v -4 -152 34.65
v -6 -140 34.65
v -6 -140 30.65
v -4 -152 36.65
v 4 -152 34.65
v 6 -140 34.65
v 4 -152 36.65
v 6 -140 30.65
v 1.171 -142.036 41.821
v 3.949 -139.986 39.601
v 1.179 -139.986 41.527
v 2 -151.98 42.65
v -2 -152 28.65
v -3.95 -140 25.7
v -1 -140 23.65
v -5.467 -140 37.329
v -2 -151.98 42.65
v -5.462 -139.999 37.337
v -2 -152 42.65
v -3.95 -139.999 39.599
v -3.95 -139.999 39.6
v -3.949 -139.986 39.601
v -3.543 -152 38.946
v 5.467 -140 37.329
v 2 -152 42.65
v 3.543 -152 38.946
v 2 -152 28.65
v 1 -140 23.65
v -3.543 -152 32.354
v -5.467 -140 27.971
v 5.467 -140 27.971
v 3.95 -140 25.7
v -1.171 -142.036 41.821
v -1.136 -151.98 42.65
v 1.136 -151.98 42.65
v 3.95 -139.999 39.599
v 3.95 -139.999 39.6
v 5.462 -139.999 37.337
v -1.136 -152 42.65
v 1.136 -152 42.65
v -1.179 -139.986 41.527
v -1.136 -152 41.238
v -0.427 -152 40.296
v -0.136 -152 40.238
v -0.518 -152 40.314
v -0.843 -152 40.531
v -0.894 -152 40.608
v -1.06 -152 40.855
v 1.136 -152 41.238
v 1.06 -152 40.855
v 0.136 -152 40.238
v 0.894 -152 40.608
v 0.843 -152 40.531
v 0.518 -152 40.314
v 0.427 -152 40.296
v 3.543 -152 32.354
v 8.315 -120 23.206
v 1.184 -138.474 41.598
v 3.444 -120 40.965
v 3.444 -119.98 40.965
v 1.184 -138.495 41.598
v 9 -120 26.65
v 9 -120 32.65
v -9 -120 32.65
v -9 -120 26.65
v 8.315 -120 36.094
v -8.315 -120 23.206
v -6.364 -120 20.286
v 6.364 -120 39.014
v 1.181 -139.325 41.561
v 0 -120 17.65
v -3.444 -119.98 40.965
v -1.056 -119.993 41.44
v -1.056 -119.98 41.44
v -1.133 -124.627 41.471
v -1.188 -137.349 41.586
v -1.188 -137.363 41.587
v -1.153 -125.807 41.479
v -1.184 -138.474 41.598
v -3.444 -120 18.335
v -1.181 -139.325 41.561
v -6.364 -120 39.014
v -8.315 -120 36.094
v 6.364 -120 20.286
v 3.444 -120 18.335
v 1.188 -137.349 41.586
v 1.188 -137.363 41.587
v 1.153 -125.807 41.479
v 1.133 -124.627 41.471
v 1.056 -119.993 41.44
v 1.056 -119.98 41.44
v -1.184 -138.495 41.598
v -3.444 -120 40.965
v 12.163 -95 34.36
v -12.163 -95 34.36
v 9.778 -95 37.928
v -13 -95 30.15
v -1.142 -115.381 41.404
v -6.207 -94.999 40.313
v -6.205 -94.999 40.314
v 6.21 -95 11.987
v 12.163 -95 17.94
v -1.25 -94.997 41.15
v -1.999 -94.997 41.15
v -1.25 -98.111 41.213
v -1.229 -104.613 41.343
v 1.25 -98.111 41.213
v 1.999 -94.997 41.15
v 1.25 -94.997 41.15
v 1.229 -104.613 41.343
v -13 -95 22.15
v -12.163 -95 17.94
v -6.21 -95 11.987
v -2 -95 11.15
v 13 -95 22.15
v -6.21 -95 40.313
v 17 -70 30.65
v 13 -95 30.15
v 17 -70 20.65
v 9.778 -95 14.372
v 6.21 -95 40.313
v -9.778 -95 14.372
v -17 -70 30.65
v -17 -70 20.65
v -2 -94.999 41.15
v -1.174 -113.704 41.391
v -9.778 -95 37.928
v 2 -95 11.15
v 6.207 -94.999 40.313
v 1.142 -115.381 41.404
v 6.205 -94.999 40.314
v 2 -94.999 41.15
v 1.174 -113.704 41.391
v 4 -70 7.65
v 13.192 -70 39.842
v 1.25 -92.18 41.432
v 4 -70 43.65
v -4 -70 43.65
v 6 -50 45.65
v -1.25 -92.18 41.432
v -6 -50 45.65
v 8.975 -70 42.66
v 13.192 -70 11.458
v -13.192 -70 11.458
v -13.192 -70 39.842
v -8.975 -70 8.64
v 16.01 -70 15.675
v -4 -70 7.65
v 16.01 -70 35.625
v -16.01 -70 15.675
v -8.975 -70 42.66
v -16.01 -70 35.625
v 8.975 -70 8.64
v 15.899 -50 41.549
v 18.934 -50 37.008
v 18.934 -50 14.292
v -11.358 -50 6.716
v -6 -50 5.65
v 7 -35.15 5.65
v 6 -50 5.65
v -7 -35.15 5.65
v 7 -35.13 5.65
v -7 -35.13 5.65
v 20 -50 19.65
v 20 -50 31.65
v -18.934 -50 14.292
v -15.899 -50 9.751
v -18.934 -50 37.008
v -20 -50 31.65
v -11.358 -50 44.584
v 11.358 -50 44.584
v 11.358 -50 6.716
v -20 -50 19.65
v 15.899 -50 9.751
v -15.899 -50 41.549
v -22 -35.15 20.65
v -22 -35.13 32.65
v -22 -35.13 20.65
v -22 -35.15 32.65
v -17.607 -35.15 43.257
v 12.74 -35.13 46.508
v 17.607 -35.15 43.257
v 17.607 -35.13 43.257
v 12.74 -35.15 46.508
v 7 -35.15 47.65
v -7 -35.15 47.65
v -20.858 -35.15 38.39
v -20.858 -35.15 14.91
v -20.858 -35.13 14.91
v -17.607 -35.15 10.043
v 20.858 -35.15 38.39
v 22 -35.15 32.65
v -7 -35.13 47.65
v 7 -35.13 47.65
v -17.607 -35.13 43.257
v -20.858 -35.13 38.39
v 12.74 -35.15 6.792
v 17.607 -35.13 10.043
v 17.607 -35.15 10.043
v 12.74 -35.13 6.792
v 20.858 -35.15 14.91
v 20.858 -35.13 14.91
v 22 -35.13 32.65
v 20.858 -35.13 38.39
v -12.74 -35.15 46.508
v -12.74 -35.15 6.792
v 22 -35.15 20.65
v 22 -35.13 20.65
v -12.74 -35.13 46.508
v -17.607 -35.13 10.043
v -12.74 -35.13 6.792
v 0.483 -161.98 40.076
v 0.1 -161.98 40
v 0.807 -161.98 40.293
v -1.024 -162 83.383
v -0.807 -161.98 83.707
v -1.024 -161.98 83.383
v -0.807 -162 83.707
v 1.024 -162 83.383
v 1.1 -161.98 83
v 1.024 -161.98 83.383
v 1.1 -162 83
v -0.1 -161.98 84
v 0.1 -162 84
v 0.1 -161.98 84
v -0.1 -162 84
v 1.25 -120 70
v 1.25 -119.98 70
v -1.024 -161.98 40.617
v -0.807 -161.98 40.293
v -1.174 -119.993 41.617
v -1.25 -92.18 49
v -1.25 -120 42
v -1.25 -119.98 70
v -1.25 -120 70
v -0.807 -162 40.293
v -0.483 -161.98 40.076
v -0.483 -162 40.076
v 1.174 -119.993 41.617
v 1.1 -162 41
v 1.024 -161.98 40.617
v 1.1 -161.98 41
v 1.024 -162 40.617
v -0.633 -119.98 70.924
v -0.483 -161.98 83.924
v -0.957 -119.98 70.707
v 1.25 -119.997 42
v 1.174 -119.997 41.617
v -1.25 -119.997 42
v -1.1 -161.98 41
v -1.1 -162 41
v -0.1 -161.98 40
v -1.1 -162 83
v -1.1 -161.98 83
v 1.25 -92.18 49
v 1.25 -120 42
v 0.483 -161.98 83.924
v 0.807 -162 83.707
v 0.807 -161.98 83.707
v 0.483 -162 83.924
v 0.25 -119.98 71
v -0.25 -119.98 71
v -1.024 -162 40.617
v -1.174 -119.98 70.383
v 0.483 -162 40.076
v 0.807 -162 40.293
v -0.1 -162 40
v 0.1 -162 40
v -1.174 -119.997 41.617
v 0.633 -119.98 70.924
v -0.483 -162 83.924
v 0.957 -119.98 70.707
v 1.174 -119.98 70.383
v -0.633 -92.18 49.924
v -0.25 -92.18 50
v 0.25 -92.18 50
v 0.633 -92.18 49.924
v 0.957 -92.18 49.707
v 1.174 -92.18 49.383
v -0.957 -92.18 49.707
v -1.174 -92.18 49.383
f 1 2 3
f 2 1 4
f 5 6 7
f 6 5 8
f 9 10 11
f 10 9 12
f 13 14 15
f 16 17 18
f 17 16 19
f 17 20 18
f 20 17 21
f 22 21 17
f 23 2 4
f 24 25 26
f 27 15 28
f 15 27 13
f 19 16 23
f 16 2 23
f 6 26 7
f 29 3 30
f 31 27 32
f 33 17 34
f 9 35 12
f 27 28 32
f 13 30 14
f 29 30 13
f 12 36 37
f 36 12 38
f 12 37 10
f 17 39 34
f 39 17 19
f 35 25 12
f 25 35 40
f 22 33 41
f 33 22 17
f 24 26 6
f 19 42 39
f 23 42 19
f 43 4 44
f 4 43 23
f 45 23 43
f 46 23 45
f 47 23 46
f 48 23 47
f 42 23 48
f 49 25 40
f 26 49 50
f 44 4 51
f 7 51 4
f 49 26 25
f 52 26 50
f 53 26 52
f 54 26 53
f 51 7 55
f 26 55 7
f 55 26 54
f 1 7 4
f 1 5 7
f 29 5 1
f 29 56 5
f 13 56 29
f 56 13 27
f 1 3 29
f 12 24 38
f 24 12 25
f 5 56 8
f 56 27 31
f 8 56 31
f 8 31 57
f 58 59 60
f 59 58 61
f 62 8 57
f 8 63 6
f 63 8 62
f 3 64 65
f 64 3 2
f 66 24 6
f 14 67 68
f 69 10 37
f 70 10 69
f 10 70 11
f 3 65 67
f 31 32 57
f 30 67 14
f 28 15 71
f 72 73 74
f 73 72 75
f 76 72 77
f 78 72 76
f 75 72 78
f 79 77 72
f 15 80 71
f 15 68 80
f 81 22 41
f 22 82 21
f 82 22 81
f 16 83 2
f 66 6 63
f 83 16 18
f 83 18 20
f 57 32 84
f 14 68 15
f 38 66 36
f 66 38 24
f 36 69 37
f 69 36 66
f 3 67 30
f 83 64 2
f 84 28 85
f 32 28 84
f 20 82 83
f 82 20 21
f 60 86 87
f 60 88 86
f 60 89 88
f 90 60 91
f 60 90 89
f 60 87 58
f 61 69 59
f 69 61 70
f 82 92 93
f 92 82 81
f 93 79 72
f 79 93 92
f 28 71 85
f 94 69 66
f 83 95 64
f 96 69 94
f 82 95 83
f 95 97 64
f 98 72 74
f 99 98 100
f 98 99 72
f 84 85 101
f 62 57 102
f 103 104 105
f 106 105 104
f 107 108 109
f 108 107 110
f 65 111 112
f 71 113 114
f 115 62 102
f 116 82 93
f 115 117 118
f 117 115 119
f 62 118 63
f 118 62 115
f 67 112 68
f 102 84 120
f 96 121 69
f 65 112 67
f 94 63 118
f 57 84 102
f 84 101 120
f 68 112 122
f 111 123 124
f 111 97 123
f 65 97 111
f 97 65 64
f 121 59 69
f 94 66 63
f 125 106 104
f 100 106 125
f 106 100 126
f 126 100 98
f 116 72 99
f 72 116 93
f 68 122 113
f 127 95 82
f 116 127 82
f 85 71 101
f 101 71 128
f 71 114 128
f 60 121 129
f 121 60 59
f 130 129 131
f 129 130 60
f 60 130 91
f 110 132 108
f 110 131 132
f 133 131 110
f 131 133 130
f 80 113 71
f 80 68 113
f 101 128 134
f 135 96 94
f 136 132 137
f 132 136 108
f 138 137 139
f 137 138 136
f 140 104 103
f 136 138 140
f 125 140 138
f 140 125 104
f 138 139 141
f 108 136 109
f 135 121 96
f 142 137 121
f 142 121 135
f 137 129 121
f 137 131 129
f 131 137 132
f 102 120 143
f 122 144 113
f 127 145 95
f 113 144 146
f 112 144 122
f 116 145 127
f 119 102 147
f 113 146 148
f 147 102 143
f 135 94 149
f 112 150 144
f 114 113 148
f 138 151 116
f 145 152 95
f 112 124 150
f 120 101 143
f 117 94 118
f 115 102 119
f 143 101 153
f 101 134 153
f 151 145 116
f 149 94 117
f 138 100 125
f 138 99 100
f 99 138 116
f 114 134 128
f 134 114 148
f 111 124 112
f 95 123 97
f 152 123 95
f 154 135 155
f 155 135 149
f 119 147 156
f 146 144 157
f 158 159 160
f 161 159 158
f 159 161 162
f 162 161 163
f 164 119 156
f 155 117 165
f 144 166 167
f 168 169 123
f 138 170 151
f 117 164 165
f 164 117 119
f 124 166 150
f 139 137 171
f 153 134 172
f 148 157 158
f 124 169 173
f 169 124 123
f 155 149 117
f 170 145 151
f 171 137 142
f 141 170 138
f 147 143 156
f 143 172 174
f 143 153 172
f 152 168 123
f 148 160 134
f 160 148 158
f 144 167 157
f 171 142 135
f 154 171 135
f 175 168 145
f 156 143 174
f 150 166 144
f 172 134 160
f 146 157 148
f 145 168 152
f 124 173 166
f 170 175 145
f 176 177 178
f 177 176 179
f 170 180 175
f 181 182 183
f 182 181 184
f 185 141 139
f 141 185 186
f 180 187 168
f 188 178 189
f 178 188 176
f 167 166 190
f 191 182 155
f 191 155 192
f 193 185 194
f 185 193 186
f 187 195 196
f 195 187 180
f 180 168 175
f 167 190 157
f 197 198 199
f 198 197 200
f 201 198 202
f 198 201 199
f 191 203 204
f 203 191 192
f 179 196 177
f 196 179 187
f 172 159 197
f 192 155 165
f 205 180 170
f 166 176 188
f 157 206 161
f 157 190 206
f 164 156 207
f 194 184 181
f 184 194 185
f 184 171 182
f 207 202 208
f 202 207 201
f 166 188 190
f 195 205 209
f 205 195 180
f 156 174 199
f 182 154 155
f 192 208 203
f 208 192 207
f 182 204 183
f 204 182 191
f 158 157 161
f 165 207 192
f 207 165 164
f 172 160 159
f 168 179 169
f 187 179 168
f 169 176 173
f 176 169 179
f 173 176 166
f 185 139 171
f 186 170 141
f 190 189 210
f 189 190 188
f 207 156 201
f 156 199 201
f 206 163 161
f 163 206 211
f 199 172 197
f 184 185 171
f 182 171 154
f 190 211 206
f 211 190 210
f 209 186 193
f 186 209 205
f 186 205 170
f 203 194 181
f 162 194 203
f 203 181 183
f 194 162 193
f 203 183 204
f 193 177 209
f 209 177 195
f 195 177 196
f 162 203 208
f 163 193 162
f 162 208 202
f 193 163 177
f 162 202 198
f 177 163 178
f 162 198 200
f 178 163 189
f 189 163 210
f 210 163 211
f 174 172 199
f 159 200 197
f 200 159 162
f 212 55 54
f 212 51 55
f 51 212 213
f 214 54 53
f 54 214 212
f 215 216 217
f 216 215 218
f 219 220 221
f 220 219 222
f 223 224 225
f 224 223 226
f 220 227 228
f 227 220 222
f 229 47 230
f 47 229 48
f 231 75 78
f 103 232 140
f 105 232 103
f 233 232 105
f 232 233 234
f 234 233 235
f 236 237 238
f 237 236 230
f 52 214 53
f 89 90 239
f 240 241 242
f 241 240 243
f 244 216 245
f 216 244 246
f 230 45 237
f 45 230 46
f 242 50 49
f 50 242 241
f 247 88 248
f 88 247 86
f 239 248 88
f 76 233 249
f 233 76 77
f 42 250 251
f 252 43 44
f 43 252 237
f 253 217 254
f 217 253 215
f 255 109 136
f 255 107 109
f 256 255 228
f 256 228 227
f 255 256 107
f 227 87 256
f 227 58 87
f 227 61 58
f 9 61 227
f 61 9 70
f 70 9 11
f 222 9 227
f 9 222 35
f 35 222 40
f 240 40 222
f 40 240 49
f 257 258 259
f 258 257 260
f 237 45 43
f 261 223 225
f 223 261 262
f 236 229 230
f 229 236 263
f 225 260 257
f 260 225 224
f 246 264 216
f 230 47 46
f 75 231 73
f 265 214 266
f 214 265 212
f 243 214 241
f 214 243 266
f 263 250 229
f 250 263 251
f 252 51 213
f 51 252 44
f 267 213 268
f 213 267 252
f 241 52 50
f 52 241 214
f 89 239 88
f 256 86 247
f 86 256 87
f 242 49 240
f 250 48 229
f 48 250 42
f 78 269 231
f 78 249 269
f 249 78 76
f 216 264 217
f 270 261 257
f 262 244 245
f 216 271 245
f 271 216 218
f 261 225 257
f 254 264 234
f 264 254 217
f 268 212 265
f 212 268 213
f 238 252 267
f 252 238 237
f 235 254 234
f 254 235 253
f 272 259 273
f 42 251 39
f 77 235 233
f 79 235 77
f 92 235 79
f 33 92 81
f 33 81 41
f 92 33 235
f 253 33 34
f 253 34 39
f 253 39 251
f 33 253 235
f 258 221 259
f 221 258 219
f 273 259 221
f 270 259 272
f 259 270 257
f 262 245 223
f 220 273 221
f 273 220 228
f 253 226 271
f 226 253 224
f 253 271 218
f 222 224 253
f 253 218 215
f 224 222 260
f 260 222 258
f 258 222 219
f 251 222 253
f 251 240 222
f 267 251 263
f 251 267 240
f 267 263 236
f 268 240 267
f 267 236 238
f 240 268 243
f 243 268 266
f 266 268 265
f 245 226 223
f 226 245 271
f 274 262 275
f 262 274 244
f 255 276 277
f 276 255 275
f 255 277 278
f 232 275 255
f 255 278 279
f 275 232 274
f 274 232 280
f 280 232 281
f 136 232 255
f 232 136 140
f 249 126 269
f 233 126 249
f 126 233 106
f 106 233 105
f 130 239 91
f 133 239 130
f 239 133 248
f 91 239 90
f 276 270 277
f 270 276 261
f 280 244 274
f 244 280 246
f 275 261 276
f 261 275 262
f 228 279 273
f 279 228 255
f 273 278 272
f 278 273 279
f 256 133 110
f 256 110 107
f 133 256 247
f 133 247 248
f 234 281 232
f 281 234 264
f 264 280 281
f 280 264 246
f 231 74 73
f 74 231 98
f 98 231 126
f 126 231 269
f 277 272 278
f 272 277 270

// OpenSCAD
// file: ../lib.scad
// ===== 공용 프리미티브 (params 의존 없음 — use로 포함. 함정 1) =====

// 두 점을 잇는 캡슐. 끝단이 od/2 만큼 뻗는다 (함정 3)
module rod(p1, p2, od, fn = 56)
    hull() { translate(p1) sphere(d = od, $fn = fn);
             translate(p2) sphere(d = od, $fn = fn); }

function mir(p, s = 1) = [s * p.x, p.y, p.z];

// --- 라운디드 사각 2D 폴리곤 (CCW) ---
function arc_pt(cx, cy, r, a) = [cx + r * cos(a), cy + r * sin(a)];
function rrpts(w, h, r, n = 4) =
    let (x = w / 2 - r, y = h / 2 - r)
    concat(
        [for (i = [0:n]) arc_pt( x, -y, r, -90 + 90 * i / n)],
        [for (i = [0:n]) arc_pt( x,  y, r,   0 + 90 * i / n)],
        [for (i = [0:n]) arc_pt(-x,  y, r,  90 + 90 * i / n)],
        [for (i = [0:n]) arc_pt(-x, -y, r, 180 + 90 * i / n)]);

// y 위치의 XZ 단면 슬래브 (중심 x0/zc, 폭 w/높이 h, 모서리 r).
// 회전 매핑: 2D x→차량 X, 2D y→차량 Z, 돌출 +z→−Y (y..y+0.02 전방 전용, 함정 20)
module slabr(y, x0, w, h, zc, r)
    translate([x0, y + 0.02, zc]) rotate([90, 0, 0])
        linear_extrude(0.02) polygon(rrpts(w, h, r));

// 단면 체인 loft: sec = [[y, x0, w, h, zc, r], ...]
module loftr(sec)
    for (i = [0 : len(sec) - 2])
        hull() {
            slabr(sec[i][0],     sec[i][1],     sec[i][2],     sec[i][3],     sec[i][4],     sec[i][5]);
            slabr(sec[i + 1][0], sec[i + 1][1], sec[i + 1][2], sec[i + 1][3], sec[i + 1][4], sec[i + 1][5]);
        }

// 라운디드 박스 (z0..z1 수직, 평면 모서리 r)
module rbox(xc, yc, z0, z1, dx, dy, r, fn = 32)
    hull() for (px = [-1, 1], py = [-1, 1])
        translate([xc + px * (dx / 2 - r), yc + py * (dy / 2 - r), z0])
            cylinder(r = r, h = z1 - z0, $fn = fn);

// --- NACA 계열 에어포일 (LE 원점, 2D +x = 현 방향) ---
function _yt(x, c, t) = 5 * t * c * (0.2969*sqrt(x) - 0.1260*x - 0.3516*x*x
    + 0.2843*x*x*x - 0.1036*x*x*x*x);
function _yc(x, c, m) = 4 * m * c * x * (1 - x);
function naca_pts(c, t, m, n = 12) =
    concat(
        [for (i = [0:n])     let (x = i / n)     [x*c,  _yt(x, c, t) + _yc(x, c, m)]],
        [for (i = [n-1:-1:0]) let (x = i / n)    [x*c, -_yt(x, c, t) + _yc(x, c, m)]]);

// 슬라이스 3D 링: v=[x, yle, zle, c, aoa, th, cam] → 받각 회전된 naca 점의 링
// (th/cam은 mm — 현 대비 비율로 정규화)
function wring(v, n = 12) =
    let (c = v[3], t = v[5] / c, m = v[6] / c, pts = naca_pts(c, t, m, n),
         ca = cos(v[4]), sa = sin(v[4]))
    // 코드 방향 (ca,sa) + 두께/캠버 수직 방향 (-sa,ca) — 2D y 누락 금지
    [for (p = pts) [v[0], v[1] + p[0] * ca - p[1] * sa, v[2] + p[0] * sa + p[1] * ca]];

// 진짜 로프트 윙 — polyhedron 스트립. hull 체인은 캠버진 하면을 볼록 껍질로
// 채워(LE→TE 직선 웨지) 요소가 처지므로 쓰지 않는다
module wing3(sl, n = 12) {
    rings = [for (v = sl) wring(v, n)];
    ns = len(rings);
    m = len(rings[0]);
    pts = [for (r = rings, p = r) p];
    function ix(i, k) = i * m + (k % m);
    faces = concat(
        // 측면 스트립 (사중면 → 삼각형 2) — 외향 노멀 권선(캡과 일치)
        [for (i = [0 : ns - 2], k = [0 : m - 1])
            each [[ix(i, k), ix(i, k + 1), ix(i + 1, k + 1)],
                  [ix(i, k), ix(i + 1, k + 1), ix(i + 1, k)]]],
        // 끝 캡 (링은 단순 폴리곤 — 팬 삼각분할)
        [for (k = [1 : m - 2]) [ix(0, 0), ix(0, k + 1), ix(0, k)]],
        [for (k = [1 : m - 2]) [ix(ns - 1, 0), ix(ns - 1, k), ix(ns - 1, k + 1)]]
    );
    polyhedron(points = pts, faces = faces, convexity = 4);
}

// 반쪽 슬라이스 → x-대칭 전체. 규약: half는 센터(x=0)→팁 순서(내림차순 x).
// 결과는 x 오름차순 체인. x=0 센터만 중복 제외 (그 외 전부 미러)
function wsym(half) =
    concat([for (i = [len(half) - 1 : -1 : 0]) half[i]],
           [for (i = [0 : len(half) - 1]) if (abs(half[i][0]) > 1e-9)
               concat([-half[i][0]], [for (j = [1 : len(half[i]) - 1]) half[i][j]])]);

// 환(링), 축 Z
module ann(r_in, r_out, h, fn = 96)
    difference() { cylinder(r = r_out, h = h, center = true, $fn = fn);
                   cylinder(r = r_in,  h = h + 2, center = true, $fn = fn); }

// 리스트 전체 x반전+순서 역행 (센터 구간 없는 플랩 등 — 좌우 별도 wing3 호출용).
// x반전만 하면 행렬식이 음수가 되어 권선이 뒤집힌다 → 순서 역행으로 상쇄
function msym(half) =
    [for (i = [len(half) - 1 : -1 : 0])
        concat([-half[i][0]], [for (j = [1 : len(half[i]) - 1]) half[i][j]])];
// file: ../params.scad
// =====================================================================
// F1 그랜드파이언스 카 1:10 — 전체 파라미터 (유일한 수정 지점)
// 좌표계: +Y 전방, +X 좌측, +Z 상방, 지면 z=0, 원점=휠베이스 중심
// 전장 558 (y -268..+278), 전폭 194, 휠베이스 360, 타이어 OD 72 (720mm)
// 30부품. loftr 단면 = [y, x0, w, h, zc, r] (XZ 단면, y..y+0.02 슬래브)
// wing3 슬라이스 = [x, yle, zle, c, aoa, th, cam]
//   aoa: 현 방향의 X축 회전각. 전방 받각 요소는 165~170 (TE가 뒤+위)
// =====================================================================
$fn = 96;

// -- 휠/액슬 (실차 720mm 타이어, 18인치 림, 트랙 F1600/R1550) --
AXF_Y = 180;   AXR_Y = -180;
WHF_X = 80;    WHR_X = 77.5;
WH_Z  = 36;
TIRF_W = 30.5; TIRR_W = 40.5;  TIR_R = 36;
TIR_FN = 288;                 // 타이어 회전체 해상도
RIM_R = 23.2;  RIM_T = 1.0;   // 림 배럴 반경/두께
RIM_LF = 12.4; RIM_LR = 17.4; // 림 배럴 반폭
HUB_BORE = 7.0; STUB_D = 6.2; // 방사 간극 0.4
DISC_R = 15.5;                // 브레이크 디스크

// -- 바디 공통 레벨 --
FLO_Z0 = 2.0;  FLO_Z1 = 5.5;  // 플로어 (두께 3.5)
BOD_Z0 = 5.65;                // 샤시/카버/기어박스 바닥 (플로어 위 0.15)
J = 0.15;                     // 부품 접합 기본 간극
ARM_OD = 3.4;                 // 서스펜션 암 캡슐 직경

// ===== 01 플로어 =====
FLOOR_SEC = [
    [132,    0,  92, 3.5, 3.75, 1.5], [100, 0, 118, 3.5, 3.75, 1.5],
    [60,     0, 130, 3.5, 3.75, 2.0], [10,  0, 132, 3.5, 3.75, 2.0],
    [-60,    0, 128, 3.5, 3.75, 2.0], [-120, 0, 112, 3.5, 3.75, 2.0],
    [-161.85, 0, 100, 3.5, 3.75, 2.0]];

// ===== 02 디퓨저 (램프 + 스트레이크는 부품 내부) =====
DIFF_SEC = [
    [-230,   0, 100, 10.0, 11.0, 1.5], [-215, 0, 100, 8.0,  9.0, 1.5],
    [-190,   0, 100,  6.0,  6.2, 1.5], [-162.0, 0, 100, 4.0, 4.15, 1.5]];
DIFF_TOP = [[-175, 7.8], [-205, 11.9], [-228, 15.6]];  // (y, 램프 상면 z)

// ===== 03 플로어 에지 윙 =====
FEW_SEC = [   // [y, x0, w, h, zc, r] — x0 부호로 좌우
    [55,   63.5, 3.0, 2.0, 6.65, 1.0], [-5,  65.5, 3.0, 5.5, 8.40, 1.5],
    [-70,  63.0, 3.0, 4.0, 7.65, 1.5], [-120, 58.0, 3.0, 3.0, 7.15, 1.5]];
FEW2_SEC = [
    [100, 57.0, 2.5, 1.5, 6.40, 0.8], [60, 60.0, 2.5, 2.0, 6.65, 0.8]];

// ===== 04 노우즈 =====
NOSE_SEC = [
    [95,   0, 38, 28, 25.3, 12], [100,  0, 38, 29, 25.3, 12],
    [115,  0, 36, 28, 23.8, 11], [135,  0, 31, 24, 21.3,  9],
    [160,  0, 27, 20, 18.3,  8], [185,  0, 23, 17, 15.8,  7],
    [205,  0, 20, 15, 14.3,  6], [224,  0, 17, 12, 12.3,  5],
    [242,  0, 14,  9, 10.8,  4], [258,  0, 10,  7, 10.1,  3],
    [272,  0,  4.5, 4.5, 9.8, 2], [273.5, 0, 1.2, 1.2, 9.8, 0.6]];

// ===== 05 샤시(모노코크) + 콕핏 컷 =====
CHAS_SEC = [
    [-34.85, 0, 46, 44, 27.65, 15], [-10, 0, 48, 46, 28.65, 15],
    [20,     0, 48, 44, 27.65, 15], [60,  0, 46, 40, 25.65, 14],
    [94.85,  0, 42, 34, 22.65, 12]];
CKP_CUT = [[62, 0, 34, 32, 46, 3], [-30, 0, 34, 30, 45, 3]];

// ===== 06 엔진 커버 + 샤크핀 =====
COV_SEC = [
    [-152,   0,  8, 14, 35.65,  6], [-140, 0, 12, 18, 32.65,  7],
    [-120,   0, 18, 24, 29.65,  9], [-95,  0, 26, 30, 26.15, 11],
    [-70,    0, 34, 36, 25.65, 13], [-50,  0, 40, 40, 25.65, 14],
    [-35.15, 0, 44, 42, 26.65, 15]];
FIN_SEC = [
    [-162, 0, 2.2, 44, 62.0, 1], [-120, 0, 2.5, 30, 56.0, 1],
    [-92.2, 0, 2.5, 10, 45.0, 1]];

// ===== 07 에어박스 (험프 + 인테이크 링) =====
ABX_SEC = [
    [-92, 0, 14, 17, 50.00, 6], [-68, 0, 20, 24, 56.60, 8],
    [-46, 0, 22, 26, 59.60, 8], [-34, 0, 22, 13, 56.30, 6]];
ABX_RING_C = [0, -45, 73.5];  ABX_RING_R = 11;  ABX_RING_T = 4.5;
ABX_RING_SZ = 0.72;

// ===== 08 사이드포드 (x0=±41.5) =====
SPOD_X0 = 41.5;
SPOD_SEC = [   // [y, w, h, zc, r]
    [38,   34, 26, 18.65, 8], [5,   34, 28, 19.65, 9], [-25,  34, 26, 18.65, 9],
    [-55,  32, 21, 18.15, 8], [-80, 30, 15, 17.15, 8], [-100, 26,  9, 16.15, 7]];
SPOD_INLET = [24, 18, 19, 2.3];  // 컷: w, h, zc, 깊이

// ===== 09 할로 =====
HALO_N = 28;  HALO_OD = 9;
HALO_RX = 22; HALO_RY = 44; HALO_CY = 12;  // 타원 계획면(평면도)
HALO_Z0 = 75; HALO_ZA = 2;                 // z(t) = Z0 + ZA*cos(t)

// ===== 10/11/12/13 프런트 윙 =====
FW_MAIN_HALF = [   // 반쪽(x≤0) — wsym()로 전체화
    [0,    258.3, 2.4, 20, 170, 1.4, 2.0],
    [-16,  259.0, 3.4, 27, 165, 1.6, 2.4],
    [-40,  260.0, 3.6, 40, 166, 1.8, 2.8],
    [-60,  257.0, 4.0, 37, 167, 1.7, 2.6],
    [-80,  258.0, 4.4, 31, 166, 1.6, 2.2],
    [-95.2, 263.0, 4.6, 26, 166, 1.5, 1.8]];
FW_F1_HALF = [
    [-16,  253.0, 8.0, 22, 155, 1.3, 4.0],
    [-40,  250.5, 8.2, 26, 156, 1.4, 4.2],
    [-60,  249.5, 8.4, 26, 157, 1.4, 4.2],
    [-80,  250.0, 8.6, 24, 158, 1.4, 4.0],
    [-95.2, 254.0, 8.8, 21, 158, 1.3, 3.5]];
FW_F2_HALF = [
    [-16,  258.0, 12.4, 17, 147, 1.2, 4.5],
    [-40,  255.5, 12.6, 20, 148, 1.3, 4.8],
    [-60,  254.5, 12.8, 20, 149, 1.3, 4.8],
    [-80,  254.5, 13.0, 19, 150, 1.3, 4.5],
    [-95.2, 258.0, 13.2, 17, 150, 1.2, 4.0]];
FW_EP_X = 96.3;  FW_EP_T = 1.5;   // 엔드플레이트 x 중심/두께
FW_EP_PTS = [    // (y,z) 아웃라인
    [226, 1.5], [266, 1.5], [266, 8], [263, 24.5], [252, 24.5],
    [244, 17], [233, 15], [226, 9]];
FW_MT_SEC = [   // 마운트 플레이트 [y, x0(±2.6), w, h, zc, r] — 노우즈 저면 라운딩 회피
    [244, 2.6, 1.6, 1.8, 5.25, 0.5], [250, 2.6, 1.6, 1.8, 5.25, 0.5]];

// ===== 14 리어 윙 =====
RW_MAIN = [
    [-50.8, -212, 57.5, 46, 162, 2.2, -3.5], [-25, -211, 56.6, 47, 162, 2.3, -4.0],
    [0,     -210, 54.2, 47, 162, 2.3, -4.0], [25,  -211, 56.6, 47, 162, 2.3, -4.0],
    [50.8,  -212, 57.5, 46, 162, 2.2, -3.5]];
RW_FLAP = [
    [-49.6, -234,   71.8, 30, 155, 1.8, -4.5],
    [0,     -235.5, 73.0, 30, 155, 1.8, -4.5],
    [49.6,  -234,   71.8, 30, 155, 1.8, -4.5]];
RW_EP_X = 52;  RW_EP_T = 2;
RW_EP_PTS = [
    [-200, 46], [-268, 46], [-268, 60], [-262, 93], [-250, 93],
    [-243, 72], [-218, 64], [-202, 74]];
RW_DRS = [-245, 79.4, 5.0, 2.6, 3.0];   // 팟: y, z, w, h, 두께

// ===== 15 빔 윙 =====
BEAM_E1 = [
    [-50.9, -204.5, 31.5, 16, 162, 1.8, -2.5], [0, -205.5, 30.4, 16, 162, 1.8, -2.5],
    [50.9,  -204.5, 31.5, 16, 162, 1.8, -2.5]];
BEAM_E2 = [
    [-50.9, -210, 36.8, 15, 158, 1.6, -3.0], [0, -211, 35.6, 15, 158, 1.6, -3.0],
    [50.9,  -210, 36.8, 15, 158, 1.6, -3.0]];
BEAM_PLATE = [-214, -200.15, 8.2, 22, 31];  // 마운트 플레이트 y1,y0,x반폭,z0,z1

// ===== 16 리어윙 파일론(쌍둥 스완넥) =====
RW_PYL = [[-158, 55.0], [-190, 58.0], [-212.5, 63.0]];  // (y, z), x=±5.4
RW_PYL_X = 5.4;  RW_PYL_OD = 8;

// ===== 17 미러 =====
MIR_BASE = [14, 63, 46.0];  MIR_HOUSE = [31, 66, 56.5];

// ===== 18 헬멧 =====
HELM_C = [0, 0, 55];  HELM_R = 11.5;
HELM_SC = [1, 1.18, 1.02];

// ===== 19 콕핏 트림 =====
SEAT_SEC  = [[30, 0, 26, 13.2, 36.75, 3], [-10, 0, 26, 13.2, 36.75, 3]];
HREST_SEC = [[12, 0, 32, 15, 53.5, 5], [-20, 0, 32, 15, 53.5, 5]];

// ===== 20 스티어링 휠 =====
SW_C = [0, 40, 47];  SW_TILT = 20;

// ===== 21/22 서스펜션 (픽업=[x, y, z], 암 끝은 업라이트 내부) =====
FUP = [61, 183, 46];  FLO_BALL = [61.5, 181, 24];  FTR = [61.5, 177, 35];
FPU = [61.5, 180, 27];
F_ARM = [   // [픽업, 볼]
    [[12.0, 206, 20.0], FUP],  [[16.0, 152, 23.0], FUP],
    [[11.9, 208,  9.3], FLO_BALL], [[16.3, 150, 12.0], FLO_BALL],
    [[15.6, 162, 14.0], FTR]];
F_PUSH = [[11.8, 198, 24.4], FPU];
RUP = [53.5, -182, 46];  RLO = [54, -179, 23];  RDRIVE_O = [52, -180, 31];
R_ARM = [
    [[13.3, -160, 47.0], RUP], [[13.3, -198, 45.0], RUP],
    [[12.8, -158, 20.4], RLO], [[9.2, -202, 19.6], RLO]];
R_PULL = [[12.6, -177, 23.75], [53.5, -181, 44]];
R_DRIVE = [[13.2, -180, 17.0], RDRIVE_O];

// ===== 23/24 브레이크 스쿱 =====
SCOOP_F = [[164.2, 59.5, 7, 11, 30, 3], [158, 58.5, 5.5, 8, 28.5, 2.5]];
SCOOP_R = [[-164.2, 48, 7, 10, 29, 3], [-158, 46, 5, 7.5, 27.5, 2.5]];

// ===== 25~28 타이어/림 =====
TIRE_BEAD = 2.6;   // 비드 안쪽 세팅 (단면 반경 23.4)

// ===== 29 기어박스 + 리어 크래시 =====
GEAR_SEC = [
    [-258,   0,  4,  1.8, 15.00, 1.5], [-252, 0,  6,  1.6, 16.30, 2],
    [-230,   0,  9,  1.4, 18.30, 3],   [-208, 0, 12,  4.9, 15.05, 4],
    [-195,   0, 16,  9.35, 14.83, 5],   [-170, 0, 20, 15.1, 15.45, 6],
    [-145,   0, 22, 15.95, 13.60, 7],  [-117.85, 0, 26, 8.6,  9.95, 8]];
GEAR_TOWER = [-200, -158, 8, 11.3, 28, 50];  // y1,y0,x내측,x외측,z0,z1
RAIN_LT = [-258.6, 5, 4];   // y면, w, h

// ===== 30 카메라/안테나 =====
TCAM_Y = -45;  TCAM_Z0 = 84.8;
SIDECAM = [[194, 19.0], [202, 18.5]];  // (y, z) — x는 노우즈 반폭+0.15
ANT = [[4, 70], [-4, 70]];             // (x, y) — chassis 탑
// main file
// 06 엔진 커버 — 코크존 테이퍼 + 샤크핀
include <../params.scad>
use <../lib.scad>

module engine_cover() {
    loftr(COV_SEC);
    loftr(FIN_SEC);
}

engine_cover();
